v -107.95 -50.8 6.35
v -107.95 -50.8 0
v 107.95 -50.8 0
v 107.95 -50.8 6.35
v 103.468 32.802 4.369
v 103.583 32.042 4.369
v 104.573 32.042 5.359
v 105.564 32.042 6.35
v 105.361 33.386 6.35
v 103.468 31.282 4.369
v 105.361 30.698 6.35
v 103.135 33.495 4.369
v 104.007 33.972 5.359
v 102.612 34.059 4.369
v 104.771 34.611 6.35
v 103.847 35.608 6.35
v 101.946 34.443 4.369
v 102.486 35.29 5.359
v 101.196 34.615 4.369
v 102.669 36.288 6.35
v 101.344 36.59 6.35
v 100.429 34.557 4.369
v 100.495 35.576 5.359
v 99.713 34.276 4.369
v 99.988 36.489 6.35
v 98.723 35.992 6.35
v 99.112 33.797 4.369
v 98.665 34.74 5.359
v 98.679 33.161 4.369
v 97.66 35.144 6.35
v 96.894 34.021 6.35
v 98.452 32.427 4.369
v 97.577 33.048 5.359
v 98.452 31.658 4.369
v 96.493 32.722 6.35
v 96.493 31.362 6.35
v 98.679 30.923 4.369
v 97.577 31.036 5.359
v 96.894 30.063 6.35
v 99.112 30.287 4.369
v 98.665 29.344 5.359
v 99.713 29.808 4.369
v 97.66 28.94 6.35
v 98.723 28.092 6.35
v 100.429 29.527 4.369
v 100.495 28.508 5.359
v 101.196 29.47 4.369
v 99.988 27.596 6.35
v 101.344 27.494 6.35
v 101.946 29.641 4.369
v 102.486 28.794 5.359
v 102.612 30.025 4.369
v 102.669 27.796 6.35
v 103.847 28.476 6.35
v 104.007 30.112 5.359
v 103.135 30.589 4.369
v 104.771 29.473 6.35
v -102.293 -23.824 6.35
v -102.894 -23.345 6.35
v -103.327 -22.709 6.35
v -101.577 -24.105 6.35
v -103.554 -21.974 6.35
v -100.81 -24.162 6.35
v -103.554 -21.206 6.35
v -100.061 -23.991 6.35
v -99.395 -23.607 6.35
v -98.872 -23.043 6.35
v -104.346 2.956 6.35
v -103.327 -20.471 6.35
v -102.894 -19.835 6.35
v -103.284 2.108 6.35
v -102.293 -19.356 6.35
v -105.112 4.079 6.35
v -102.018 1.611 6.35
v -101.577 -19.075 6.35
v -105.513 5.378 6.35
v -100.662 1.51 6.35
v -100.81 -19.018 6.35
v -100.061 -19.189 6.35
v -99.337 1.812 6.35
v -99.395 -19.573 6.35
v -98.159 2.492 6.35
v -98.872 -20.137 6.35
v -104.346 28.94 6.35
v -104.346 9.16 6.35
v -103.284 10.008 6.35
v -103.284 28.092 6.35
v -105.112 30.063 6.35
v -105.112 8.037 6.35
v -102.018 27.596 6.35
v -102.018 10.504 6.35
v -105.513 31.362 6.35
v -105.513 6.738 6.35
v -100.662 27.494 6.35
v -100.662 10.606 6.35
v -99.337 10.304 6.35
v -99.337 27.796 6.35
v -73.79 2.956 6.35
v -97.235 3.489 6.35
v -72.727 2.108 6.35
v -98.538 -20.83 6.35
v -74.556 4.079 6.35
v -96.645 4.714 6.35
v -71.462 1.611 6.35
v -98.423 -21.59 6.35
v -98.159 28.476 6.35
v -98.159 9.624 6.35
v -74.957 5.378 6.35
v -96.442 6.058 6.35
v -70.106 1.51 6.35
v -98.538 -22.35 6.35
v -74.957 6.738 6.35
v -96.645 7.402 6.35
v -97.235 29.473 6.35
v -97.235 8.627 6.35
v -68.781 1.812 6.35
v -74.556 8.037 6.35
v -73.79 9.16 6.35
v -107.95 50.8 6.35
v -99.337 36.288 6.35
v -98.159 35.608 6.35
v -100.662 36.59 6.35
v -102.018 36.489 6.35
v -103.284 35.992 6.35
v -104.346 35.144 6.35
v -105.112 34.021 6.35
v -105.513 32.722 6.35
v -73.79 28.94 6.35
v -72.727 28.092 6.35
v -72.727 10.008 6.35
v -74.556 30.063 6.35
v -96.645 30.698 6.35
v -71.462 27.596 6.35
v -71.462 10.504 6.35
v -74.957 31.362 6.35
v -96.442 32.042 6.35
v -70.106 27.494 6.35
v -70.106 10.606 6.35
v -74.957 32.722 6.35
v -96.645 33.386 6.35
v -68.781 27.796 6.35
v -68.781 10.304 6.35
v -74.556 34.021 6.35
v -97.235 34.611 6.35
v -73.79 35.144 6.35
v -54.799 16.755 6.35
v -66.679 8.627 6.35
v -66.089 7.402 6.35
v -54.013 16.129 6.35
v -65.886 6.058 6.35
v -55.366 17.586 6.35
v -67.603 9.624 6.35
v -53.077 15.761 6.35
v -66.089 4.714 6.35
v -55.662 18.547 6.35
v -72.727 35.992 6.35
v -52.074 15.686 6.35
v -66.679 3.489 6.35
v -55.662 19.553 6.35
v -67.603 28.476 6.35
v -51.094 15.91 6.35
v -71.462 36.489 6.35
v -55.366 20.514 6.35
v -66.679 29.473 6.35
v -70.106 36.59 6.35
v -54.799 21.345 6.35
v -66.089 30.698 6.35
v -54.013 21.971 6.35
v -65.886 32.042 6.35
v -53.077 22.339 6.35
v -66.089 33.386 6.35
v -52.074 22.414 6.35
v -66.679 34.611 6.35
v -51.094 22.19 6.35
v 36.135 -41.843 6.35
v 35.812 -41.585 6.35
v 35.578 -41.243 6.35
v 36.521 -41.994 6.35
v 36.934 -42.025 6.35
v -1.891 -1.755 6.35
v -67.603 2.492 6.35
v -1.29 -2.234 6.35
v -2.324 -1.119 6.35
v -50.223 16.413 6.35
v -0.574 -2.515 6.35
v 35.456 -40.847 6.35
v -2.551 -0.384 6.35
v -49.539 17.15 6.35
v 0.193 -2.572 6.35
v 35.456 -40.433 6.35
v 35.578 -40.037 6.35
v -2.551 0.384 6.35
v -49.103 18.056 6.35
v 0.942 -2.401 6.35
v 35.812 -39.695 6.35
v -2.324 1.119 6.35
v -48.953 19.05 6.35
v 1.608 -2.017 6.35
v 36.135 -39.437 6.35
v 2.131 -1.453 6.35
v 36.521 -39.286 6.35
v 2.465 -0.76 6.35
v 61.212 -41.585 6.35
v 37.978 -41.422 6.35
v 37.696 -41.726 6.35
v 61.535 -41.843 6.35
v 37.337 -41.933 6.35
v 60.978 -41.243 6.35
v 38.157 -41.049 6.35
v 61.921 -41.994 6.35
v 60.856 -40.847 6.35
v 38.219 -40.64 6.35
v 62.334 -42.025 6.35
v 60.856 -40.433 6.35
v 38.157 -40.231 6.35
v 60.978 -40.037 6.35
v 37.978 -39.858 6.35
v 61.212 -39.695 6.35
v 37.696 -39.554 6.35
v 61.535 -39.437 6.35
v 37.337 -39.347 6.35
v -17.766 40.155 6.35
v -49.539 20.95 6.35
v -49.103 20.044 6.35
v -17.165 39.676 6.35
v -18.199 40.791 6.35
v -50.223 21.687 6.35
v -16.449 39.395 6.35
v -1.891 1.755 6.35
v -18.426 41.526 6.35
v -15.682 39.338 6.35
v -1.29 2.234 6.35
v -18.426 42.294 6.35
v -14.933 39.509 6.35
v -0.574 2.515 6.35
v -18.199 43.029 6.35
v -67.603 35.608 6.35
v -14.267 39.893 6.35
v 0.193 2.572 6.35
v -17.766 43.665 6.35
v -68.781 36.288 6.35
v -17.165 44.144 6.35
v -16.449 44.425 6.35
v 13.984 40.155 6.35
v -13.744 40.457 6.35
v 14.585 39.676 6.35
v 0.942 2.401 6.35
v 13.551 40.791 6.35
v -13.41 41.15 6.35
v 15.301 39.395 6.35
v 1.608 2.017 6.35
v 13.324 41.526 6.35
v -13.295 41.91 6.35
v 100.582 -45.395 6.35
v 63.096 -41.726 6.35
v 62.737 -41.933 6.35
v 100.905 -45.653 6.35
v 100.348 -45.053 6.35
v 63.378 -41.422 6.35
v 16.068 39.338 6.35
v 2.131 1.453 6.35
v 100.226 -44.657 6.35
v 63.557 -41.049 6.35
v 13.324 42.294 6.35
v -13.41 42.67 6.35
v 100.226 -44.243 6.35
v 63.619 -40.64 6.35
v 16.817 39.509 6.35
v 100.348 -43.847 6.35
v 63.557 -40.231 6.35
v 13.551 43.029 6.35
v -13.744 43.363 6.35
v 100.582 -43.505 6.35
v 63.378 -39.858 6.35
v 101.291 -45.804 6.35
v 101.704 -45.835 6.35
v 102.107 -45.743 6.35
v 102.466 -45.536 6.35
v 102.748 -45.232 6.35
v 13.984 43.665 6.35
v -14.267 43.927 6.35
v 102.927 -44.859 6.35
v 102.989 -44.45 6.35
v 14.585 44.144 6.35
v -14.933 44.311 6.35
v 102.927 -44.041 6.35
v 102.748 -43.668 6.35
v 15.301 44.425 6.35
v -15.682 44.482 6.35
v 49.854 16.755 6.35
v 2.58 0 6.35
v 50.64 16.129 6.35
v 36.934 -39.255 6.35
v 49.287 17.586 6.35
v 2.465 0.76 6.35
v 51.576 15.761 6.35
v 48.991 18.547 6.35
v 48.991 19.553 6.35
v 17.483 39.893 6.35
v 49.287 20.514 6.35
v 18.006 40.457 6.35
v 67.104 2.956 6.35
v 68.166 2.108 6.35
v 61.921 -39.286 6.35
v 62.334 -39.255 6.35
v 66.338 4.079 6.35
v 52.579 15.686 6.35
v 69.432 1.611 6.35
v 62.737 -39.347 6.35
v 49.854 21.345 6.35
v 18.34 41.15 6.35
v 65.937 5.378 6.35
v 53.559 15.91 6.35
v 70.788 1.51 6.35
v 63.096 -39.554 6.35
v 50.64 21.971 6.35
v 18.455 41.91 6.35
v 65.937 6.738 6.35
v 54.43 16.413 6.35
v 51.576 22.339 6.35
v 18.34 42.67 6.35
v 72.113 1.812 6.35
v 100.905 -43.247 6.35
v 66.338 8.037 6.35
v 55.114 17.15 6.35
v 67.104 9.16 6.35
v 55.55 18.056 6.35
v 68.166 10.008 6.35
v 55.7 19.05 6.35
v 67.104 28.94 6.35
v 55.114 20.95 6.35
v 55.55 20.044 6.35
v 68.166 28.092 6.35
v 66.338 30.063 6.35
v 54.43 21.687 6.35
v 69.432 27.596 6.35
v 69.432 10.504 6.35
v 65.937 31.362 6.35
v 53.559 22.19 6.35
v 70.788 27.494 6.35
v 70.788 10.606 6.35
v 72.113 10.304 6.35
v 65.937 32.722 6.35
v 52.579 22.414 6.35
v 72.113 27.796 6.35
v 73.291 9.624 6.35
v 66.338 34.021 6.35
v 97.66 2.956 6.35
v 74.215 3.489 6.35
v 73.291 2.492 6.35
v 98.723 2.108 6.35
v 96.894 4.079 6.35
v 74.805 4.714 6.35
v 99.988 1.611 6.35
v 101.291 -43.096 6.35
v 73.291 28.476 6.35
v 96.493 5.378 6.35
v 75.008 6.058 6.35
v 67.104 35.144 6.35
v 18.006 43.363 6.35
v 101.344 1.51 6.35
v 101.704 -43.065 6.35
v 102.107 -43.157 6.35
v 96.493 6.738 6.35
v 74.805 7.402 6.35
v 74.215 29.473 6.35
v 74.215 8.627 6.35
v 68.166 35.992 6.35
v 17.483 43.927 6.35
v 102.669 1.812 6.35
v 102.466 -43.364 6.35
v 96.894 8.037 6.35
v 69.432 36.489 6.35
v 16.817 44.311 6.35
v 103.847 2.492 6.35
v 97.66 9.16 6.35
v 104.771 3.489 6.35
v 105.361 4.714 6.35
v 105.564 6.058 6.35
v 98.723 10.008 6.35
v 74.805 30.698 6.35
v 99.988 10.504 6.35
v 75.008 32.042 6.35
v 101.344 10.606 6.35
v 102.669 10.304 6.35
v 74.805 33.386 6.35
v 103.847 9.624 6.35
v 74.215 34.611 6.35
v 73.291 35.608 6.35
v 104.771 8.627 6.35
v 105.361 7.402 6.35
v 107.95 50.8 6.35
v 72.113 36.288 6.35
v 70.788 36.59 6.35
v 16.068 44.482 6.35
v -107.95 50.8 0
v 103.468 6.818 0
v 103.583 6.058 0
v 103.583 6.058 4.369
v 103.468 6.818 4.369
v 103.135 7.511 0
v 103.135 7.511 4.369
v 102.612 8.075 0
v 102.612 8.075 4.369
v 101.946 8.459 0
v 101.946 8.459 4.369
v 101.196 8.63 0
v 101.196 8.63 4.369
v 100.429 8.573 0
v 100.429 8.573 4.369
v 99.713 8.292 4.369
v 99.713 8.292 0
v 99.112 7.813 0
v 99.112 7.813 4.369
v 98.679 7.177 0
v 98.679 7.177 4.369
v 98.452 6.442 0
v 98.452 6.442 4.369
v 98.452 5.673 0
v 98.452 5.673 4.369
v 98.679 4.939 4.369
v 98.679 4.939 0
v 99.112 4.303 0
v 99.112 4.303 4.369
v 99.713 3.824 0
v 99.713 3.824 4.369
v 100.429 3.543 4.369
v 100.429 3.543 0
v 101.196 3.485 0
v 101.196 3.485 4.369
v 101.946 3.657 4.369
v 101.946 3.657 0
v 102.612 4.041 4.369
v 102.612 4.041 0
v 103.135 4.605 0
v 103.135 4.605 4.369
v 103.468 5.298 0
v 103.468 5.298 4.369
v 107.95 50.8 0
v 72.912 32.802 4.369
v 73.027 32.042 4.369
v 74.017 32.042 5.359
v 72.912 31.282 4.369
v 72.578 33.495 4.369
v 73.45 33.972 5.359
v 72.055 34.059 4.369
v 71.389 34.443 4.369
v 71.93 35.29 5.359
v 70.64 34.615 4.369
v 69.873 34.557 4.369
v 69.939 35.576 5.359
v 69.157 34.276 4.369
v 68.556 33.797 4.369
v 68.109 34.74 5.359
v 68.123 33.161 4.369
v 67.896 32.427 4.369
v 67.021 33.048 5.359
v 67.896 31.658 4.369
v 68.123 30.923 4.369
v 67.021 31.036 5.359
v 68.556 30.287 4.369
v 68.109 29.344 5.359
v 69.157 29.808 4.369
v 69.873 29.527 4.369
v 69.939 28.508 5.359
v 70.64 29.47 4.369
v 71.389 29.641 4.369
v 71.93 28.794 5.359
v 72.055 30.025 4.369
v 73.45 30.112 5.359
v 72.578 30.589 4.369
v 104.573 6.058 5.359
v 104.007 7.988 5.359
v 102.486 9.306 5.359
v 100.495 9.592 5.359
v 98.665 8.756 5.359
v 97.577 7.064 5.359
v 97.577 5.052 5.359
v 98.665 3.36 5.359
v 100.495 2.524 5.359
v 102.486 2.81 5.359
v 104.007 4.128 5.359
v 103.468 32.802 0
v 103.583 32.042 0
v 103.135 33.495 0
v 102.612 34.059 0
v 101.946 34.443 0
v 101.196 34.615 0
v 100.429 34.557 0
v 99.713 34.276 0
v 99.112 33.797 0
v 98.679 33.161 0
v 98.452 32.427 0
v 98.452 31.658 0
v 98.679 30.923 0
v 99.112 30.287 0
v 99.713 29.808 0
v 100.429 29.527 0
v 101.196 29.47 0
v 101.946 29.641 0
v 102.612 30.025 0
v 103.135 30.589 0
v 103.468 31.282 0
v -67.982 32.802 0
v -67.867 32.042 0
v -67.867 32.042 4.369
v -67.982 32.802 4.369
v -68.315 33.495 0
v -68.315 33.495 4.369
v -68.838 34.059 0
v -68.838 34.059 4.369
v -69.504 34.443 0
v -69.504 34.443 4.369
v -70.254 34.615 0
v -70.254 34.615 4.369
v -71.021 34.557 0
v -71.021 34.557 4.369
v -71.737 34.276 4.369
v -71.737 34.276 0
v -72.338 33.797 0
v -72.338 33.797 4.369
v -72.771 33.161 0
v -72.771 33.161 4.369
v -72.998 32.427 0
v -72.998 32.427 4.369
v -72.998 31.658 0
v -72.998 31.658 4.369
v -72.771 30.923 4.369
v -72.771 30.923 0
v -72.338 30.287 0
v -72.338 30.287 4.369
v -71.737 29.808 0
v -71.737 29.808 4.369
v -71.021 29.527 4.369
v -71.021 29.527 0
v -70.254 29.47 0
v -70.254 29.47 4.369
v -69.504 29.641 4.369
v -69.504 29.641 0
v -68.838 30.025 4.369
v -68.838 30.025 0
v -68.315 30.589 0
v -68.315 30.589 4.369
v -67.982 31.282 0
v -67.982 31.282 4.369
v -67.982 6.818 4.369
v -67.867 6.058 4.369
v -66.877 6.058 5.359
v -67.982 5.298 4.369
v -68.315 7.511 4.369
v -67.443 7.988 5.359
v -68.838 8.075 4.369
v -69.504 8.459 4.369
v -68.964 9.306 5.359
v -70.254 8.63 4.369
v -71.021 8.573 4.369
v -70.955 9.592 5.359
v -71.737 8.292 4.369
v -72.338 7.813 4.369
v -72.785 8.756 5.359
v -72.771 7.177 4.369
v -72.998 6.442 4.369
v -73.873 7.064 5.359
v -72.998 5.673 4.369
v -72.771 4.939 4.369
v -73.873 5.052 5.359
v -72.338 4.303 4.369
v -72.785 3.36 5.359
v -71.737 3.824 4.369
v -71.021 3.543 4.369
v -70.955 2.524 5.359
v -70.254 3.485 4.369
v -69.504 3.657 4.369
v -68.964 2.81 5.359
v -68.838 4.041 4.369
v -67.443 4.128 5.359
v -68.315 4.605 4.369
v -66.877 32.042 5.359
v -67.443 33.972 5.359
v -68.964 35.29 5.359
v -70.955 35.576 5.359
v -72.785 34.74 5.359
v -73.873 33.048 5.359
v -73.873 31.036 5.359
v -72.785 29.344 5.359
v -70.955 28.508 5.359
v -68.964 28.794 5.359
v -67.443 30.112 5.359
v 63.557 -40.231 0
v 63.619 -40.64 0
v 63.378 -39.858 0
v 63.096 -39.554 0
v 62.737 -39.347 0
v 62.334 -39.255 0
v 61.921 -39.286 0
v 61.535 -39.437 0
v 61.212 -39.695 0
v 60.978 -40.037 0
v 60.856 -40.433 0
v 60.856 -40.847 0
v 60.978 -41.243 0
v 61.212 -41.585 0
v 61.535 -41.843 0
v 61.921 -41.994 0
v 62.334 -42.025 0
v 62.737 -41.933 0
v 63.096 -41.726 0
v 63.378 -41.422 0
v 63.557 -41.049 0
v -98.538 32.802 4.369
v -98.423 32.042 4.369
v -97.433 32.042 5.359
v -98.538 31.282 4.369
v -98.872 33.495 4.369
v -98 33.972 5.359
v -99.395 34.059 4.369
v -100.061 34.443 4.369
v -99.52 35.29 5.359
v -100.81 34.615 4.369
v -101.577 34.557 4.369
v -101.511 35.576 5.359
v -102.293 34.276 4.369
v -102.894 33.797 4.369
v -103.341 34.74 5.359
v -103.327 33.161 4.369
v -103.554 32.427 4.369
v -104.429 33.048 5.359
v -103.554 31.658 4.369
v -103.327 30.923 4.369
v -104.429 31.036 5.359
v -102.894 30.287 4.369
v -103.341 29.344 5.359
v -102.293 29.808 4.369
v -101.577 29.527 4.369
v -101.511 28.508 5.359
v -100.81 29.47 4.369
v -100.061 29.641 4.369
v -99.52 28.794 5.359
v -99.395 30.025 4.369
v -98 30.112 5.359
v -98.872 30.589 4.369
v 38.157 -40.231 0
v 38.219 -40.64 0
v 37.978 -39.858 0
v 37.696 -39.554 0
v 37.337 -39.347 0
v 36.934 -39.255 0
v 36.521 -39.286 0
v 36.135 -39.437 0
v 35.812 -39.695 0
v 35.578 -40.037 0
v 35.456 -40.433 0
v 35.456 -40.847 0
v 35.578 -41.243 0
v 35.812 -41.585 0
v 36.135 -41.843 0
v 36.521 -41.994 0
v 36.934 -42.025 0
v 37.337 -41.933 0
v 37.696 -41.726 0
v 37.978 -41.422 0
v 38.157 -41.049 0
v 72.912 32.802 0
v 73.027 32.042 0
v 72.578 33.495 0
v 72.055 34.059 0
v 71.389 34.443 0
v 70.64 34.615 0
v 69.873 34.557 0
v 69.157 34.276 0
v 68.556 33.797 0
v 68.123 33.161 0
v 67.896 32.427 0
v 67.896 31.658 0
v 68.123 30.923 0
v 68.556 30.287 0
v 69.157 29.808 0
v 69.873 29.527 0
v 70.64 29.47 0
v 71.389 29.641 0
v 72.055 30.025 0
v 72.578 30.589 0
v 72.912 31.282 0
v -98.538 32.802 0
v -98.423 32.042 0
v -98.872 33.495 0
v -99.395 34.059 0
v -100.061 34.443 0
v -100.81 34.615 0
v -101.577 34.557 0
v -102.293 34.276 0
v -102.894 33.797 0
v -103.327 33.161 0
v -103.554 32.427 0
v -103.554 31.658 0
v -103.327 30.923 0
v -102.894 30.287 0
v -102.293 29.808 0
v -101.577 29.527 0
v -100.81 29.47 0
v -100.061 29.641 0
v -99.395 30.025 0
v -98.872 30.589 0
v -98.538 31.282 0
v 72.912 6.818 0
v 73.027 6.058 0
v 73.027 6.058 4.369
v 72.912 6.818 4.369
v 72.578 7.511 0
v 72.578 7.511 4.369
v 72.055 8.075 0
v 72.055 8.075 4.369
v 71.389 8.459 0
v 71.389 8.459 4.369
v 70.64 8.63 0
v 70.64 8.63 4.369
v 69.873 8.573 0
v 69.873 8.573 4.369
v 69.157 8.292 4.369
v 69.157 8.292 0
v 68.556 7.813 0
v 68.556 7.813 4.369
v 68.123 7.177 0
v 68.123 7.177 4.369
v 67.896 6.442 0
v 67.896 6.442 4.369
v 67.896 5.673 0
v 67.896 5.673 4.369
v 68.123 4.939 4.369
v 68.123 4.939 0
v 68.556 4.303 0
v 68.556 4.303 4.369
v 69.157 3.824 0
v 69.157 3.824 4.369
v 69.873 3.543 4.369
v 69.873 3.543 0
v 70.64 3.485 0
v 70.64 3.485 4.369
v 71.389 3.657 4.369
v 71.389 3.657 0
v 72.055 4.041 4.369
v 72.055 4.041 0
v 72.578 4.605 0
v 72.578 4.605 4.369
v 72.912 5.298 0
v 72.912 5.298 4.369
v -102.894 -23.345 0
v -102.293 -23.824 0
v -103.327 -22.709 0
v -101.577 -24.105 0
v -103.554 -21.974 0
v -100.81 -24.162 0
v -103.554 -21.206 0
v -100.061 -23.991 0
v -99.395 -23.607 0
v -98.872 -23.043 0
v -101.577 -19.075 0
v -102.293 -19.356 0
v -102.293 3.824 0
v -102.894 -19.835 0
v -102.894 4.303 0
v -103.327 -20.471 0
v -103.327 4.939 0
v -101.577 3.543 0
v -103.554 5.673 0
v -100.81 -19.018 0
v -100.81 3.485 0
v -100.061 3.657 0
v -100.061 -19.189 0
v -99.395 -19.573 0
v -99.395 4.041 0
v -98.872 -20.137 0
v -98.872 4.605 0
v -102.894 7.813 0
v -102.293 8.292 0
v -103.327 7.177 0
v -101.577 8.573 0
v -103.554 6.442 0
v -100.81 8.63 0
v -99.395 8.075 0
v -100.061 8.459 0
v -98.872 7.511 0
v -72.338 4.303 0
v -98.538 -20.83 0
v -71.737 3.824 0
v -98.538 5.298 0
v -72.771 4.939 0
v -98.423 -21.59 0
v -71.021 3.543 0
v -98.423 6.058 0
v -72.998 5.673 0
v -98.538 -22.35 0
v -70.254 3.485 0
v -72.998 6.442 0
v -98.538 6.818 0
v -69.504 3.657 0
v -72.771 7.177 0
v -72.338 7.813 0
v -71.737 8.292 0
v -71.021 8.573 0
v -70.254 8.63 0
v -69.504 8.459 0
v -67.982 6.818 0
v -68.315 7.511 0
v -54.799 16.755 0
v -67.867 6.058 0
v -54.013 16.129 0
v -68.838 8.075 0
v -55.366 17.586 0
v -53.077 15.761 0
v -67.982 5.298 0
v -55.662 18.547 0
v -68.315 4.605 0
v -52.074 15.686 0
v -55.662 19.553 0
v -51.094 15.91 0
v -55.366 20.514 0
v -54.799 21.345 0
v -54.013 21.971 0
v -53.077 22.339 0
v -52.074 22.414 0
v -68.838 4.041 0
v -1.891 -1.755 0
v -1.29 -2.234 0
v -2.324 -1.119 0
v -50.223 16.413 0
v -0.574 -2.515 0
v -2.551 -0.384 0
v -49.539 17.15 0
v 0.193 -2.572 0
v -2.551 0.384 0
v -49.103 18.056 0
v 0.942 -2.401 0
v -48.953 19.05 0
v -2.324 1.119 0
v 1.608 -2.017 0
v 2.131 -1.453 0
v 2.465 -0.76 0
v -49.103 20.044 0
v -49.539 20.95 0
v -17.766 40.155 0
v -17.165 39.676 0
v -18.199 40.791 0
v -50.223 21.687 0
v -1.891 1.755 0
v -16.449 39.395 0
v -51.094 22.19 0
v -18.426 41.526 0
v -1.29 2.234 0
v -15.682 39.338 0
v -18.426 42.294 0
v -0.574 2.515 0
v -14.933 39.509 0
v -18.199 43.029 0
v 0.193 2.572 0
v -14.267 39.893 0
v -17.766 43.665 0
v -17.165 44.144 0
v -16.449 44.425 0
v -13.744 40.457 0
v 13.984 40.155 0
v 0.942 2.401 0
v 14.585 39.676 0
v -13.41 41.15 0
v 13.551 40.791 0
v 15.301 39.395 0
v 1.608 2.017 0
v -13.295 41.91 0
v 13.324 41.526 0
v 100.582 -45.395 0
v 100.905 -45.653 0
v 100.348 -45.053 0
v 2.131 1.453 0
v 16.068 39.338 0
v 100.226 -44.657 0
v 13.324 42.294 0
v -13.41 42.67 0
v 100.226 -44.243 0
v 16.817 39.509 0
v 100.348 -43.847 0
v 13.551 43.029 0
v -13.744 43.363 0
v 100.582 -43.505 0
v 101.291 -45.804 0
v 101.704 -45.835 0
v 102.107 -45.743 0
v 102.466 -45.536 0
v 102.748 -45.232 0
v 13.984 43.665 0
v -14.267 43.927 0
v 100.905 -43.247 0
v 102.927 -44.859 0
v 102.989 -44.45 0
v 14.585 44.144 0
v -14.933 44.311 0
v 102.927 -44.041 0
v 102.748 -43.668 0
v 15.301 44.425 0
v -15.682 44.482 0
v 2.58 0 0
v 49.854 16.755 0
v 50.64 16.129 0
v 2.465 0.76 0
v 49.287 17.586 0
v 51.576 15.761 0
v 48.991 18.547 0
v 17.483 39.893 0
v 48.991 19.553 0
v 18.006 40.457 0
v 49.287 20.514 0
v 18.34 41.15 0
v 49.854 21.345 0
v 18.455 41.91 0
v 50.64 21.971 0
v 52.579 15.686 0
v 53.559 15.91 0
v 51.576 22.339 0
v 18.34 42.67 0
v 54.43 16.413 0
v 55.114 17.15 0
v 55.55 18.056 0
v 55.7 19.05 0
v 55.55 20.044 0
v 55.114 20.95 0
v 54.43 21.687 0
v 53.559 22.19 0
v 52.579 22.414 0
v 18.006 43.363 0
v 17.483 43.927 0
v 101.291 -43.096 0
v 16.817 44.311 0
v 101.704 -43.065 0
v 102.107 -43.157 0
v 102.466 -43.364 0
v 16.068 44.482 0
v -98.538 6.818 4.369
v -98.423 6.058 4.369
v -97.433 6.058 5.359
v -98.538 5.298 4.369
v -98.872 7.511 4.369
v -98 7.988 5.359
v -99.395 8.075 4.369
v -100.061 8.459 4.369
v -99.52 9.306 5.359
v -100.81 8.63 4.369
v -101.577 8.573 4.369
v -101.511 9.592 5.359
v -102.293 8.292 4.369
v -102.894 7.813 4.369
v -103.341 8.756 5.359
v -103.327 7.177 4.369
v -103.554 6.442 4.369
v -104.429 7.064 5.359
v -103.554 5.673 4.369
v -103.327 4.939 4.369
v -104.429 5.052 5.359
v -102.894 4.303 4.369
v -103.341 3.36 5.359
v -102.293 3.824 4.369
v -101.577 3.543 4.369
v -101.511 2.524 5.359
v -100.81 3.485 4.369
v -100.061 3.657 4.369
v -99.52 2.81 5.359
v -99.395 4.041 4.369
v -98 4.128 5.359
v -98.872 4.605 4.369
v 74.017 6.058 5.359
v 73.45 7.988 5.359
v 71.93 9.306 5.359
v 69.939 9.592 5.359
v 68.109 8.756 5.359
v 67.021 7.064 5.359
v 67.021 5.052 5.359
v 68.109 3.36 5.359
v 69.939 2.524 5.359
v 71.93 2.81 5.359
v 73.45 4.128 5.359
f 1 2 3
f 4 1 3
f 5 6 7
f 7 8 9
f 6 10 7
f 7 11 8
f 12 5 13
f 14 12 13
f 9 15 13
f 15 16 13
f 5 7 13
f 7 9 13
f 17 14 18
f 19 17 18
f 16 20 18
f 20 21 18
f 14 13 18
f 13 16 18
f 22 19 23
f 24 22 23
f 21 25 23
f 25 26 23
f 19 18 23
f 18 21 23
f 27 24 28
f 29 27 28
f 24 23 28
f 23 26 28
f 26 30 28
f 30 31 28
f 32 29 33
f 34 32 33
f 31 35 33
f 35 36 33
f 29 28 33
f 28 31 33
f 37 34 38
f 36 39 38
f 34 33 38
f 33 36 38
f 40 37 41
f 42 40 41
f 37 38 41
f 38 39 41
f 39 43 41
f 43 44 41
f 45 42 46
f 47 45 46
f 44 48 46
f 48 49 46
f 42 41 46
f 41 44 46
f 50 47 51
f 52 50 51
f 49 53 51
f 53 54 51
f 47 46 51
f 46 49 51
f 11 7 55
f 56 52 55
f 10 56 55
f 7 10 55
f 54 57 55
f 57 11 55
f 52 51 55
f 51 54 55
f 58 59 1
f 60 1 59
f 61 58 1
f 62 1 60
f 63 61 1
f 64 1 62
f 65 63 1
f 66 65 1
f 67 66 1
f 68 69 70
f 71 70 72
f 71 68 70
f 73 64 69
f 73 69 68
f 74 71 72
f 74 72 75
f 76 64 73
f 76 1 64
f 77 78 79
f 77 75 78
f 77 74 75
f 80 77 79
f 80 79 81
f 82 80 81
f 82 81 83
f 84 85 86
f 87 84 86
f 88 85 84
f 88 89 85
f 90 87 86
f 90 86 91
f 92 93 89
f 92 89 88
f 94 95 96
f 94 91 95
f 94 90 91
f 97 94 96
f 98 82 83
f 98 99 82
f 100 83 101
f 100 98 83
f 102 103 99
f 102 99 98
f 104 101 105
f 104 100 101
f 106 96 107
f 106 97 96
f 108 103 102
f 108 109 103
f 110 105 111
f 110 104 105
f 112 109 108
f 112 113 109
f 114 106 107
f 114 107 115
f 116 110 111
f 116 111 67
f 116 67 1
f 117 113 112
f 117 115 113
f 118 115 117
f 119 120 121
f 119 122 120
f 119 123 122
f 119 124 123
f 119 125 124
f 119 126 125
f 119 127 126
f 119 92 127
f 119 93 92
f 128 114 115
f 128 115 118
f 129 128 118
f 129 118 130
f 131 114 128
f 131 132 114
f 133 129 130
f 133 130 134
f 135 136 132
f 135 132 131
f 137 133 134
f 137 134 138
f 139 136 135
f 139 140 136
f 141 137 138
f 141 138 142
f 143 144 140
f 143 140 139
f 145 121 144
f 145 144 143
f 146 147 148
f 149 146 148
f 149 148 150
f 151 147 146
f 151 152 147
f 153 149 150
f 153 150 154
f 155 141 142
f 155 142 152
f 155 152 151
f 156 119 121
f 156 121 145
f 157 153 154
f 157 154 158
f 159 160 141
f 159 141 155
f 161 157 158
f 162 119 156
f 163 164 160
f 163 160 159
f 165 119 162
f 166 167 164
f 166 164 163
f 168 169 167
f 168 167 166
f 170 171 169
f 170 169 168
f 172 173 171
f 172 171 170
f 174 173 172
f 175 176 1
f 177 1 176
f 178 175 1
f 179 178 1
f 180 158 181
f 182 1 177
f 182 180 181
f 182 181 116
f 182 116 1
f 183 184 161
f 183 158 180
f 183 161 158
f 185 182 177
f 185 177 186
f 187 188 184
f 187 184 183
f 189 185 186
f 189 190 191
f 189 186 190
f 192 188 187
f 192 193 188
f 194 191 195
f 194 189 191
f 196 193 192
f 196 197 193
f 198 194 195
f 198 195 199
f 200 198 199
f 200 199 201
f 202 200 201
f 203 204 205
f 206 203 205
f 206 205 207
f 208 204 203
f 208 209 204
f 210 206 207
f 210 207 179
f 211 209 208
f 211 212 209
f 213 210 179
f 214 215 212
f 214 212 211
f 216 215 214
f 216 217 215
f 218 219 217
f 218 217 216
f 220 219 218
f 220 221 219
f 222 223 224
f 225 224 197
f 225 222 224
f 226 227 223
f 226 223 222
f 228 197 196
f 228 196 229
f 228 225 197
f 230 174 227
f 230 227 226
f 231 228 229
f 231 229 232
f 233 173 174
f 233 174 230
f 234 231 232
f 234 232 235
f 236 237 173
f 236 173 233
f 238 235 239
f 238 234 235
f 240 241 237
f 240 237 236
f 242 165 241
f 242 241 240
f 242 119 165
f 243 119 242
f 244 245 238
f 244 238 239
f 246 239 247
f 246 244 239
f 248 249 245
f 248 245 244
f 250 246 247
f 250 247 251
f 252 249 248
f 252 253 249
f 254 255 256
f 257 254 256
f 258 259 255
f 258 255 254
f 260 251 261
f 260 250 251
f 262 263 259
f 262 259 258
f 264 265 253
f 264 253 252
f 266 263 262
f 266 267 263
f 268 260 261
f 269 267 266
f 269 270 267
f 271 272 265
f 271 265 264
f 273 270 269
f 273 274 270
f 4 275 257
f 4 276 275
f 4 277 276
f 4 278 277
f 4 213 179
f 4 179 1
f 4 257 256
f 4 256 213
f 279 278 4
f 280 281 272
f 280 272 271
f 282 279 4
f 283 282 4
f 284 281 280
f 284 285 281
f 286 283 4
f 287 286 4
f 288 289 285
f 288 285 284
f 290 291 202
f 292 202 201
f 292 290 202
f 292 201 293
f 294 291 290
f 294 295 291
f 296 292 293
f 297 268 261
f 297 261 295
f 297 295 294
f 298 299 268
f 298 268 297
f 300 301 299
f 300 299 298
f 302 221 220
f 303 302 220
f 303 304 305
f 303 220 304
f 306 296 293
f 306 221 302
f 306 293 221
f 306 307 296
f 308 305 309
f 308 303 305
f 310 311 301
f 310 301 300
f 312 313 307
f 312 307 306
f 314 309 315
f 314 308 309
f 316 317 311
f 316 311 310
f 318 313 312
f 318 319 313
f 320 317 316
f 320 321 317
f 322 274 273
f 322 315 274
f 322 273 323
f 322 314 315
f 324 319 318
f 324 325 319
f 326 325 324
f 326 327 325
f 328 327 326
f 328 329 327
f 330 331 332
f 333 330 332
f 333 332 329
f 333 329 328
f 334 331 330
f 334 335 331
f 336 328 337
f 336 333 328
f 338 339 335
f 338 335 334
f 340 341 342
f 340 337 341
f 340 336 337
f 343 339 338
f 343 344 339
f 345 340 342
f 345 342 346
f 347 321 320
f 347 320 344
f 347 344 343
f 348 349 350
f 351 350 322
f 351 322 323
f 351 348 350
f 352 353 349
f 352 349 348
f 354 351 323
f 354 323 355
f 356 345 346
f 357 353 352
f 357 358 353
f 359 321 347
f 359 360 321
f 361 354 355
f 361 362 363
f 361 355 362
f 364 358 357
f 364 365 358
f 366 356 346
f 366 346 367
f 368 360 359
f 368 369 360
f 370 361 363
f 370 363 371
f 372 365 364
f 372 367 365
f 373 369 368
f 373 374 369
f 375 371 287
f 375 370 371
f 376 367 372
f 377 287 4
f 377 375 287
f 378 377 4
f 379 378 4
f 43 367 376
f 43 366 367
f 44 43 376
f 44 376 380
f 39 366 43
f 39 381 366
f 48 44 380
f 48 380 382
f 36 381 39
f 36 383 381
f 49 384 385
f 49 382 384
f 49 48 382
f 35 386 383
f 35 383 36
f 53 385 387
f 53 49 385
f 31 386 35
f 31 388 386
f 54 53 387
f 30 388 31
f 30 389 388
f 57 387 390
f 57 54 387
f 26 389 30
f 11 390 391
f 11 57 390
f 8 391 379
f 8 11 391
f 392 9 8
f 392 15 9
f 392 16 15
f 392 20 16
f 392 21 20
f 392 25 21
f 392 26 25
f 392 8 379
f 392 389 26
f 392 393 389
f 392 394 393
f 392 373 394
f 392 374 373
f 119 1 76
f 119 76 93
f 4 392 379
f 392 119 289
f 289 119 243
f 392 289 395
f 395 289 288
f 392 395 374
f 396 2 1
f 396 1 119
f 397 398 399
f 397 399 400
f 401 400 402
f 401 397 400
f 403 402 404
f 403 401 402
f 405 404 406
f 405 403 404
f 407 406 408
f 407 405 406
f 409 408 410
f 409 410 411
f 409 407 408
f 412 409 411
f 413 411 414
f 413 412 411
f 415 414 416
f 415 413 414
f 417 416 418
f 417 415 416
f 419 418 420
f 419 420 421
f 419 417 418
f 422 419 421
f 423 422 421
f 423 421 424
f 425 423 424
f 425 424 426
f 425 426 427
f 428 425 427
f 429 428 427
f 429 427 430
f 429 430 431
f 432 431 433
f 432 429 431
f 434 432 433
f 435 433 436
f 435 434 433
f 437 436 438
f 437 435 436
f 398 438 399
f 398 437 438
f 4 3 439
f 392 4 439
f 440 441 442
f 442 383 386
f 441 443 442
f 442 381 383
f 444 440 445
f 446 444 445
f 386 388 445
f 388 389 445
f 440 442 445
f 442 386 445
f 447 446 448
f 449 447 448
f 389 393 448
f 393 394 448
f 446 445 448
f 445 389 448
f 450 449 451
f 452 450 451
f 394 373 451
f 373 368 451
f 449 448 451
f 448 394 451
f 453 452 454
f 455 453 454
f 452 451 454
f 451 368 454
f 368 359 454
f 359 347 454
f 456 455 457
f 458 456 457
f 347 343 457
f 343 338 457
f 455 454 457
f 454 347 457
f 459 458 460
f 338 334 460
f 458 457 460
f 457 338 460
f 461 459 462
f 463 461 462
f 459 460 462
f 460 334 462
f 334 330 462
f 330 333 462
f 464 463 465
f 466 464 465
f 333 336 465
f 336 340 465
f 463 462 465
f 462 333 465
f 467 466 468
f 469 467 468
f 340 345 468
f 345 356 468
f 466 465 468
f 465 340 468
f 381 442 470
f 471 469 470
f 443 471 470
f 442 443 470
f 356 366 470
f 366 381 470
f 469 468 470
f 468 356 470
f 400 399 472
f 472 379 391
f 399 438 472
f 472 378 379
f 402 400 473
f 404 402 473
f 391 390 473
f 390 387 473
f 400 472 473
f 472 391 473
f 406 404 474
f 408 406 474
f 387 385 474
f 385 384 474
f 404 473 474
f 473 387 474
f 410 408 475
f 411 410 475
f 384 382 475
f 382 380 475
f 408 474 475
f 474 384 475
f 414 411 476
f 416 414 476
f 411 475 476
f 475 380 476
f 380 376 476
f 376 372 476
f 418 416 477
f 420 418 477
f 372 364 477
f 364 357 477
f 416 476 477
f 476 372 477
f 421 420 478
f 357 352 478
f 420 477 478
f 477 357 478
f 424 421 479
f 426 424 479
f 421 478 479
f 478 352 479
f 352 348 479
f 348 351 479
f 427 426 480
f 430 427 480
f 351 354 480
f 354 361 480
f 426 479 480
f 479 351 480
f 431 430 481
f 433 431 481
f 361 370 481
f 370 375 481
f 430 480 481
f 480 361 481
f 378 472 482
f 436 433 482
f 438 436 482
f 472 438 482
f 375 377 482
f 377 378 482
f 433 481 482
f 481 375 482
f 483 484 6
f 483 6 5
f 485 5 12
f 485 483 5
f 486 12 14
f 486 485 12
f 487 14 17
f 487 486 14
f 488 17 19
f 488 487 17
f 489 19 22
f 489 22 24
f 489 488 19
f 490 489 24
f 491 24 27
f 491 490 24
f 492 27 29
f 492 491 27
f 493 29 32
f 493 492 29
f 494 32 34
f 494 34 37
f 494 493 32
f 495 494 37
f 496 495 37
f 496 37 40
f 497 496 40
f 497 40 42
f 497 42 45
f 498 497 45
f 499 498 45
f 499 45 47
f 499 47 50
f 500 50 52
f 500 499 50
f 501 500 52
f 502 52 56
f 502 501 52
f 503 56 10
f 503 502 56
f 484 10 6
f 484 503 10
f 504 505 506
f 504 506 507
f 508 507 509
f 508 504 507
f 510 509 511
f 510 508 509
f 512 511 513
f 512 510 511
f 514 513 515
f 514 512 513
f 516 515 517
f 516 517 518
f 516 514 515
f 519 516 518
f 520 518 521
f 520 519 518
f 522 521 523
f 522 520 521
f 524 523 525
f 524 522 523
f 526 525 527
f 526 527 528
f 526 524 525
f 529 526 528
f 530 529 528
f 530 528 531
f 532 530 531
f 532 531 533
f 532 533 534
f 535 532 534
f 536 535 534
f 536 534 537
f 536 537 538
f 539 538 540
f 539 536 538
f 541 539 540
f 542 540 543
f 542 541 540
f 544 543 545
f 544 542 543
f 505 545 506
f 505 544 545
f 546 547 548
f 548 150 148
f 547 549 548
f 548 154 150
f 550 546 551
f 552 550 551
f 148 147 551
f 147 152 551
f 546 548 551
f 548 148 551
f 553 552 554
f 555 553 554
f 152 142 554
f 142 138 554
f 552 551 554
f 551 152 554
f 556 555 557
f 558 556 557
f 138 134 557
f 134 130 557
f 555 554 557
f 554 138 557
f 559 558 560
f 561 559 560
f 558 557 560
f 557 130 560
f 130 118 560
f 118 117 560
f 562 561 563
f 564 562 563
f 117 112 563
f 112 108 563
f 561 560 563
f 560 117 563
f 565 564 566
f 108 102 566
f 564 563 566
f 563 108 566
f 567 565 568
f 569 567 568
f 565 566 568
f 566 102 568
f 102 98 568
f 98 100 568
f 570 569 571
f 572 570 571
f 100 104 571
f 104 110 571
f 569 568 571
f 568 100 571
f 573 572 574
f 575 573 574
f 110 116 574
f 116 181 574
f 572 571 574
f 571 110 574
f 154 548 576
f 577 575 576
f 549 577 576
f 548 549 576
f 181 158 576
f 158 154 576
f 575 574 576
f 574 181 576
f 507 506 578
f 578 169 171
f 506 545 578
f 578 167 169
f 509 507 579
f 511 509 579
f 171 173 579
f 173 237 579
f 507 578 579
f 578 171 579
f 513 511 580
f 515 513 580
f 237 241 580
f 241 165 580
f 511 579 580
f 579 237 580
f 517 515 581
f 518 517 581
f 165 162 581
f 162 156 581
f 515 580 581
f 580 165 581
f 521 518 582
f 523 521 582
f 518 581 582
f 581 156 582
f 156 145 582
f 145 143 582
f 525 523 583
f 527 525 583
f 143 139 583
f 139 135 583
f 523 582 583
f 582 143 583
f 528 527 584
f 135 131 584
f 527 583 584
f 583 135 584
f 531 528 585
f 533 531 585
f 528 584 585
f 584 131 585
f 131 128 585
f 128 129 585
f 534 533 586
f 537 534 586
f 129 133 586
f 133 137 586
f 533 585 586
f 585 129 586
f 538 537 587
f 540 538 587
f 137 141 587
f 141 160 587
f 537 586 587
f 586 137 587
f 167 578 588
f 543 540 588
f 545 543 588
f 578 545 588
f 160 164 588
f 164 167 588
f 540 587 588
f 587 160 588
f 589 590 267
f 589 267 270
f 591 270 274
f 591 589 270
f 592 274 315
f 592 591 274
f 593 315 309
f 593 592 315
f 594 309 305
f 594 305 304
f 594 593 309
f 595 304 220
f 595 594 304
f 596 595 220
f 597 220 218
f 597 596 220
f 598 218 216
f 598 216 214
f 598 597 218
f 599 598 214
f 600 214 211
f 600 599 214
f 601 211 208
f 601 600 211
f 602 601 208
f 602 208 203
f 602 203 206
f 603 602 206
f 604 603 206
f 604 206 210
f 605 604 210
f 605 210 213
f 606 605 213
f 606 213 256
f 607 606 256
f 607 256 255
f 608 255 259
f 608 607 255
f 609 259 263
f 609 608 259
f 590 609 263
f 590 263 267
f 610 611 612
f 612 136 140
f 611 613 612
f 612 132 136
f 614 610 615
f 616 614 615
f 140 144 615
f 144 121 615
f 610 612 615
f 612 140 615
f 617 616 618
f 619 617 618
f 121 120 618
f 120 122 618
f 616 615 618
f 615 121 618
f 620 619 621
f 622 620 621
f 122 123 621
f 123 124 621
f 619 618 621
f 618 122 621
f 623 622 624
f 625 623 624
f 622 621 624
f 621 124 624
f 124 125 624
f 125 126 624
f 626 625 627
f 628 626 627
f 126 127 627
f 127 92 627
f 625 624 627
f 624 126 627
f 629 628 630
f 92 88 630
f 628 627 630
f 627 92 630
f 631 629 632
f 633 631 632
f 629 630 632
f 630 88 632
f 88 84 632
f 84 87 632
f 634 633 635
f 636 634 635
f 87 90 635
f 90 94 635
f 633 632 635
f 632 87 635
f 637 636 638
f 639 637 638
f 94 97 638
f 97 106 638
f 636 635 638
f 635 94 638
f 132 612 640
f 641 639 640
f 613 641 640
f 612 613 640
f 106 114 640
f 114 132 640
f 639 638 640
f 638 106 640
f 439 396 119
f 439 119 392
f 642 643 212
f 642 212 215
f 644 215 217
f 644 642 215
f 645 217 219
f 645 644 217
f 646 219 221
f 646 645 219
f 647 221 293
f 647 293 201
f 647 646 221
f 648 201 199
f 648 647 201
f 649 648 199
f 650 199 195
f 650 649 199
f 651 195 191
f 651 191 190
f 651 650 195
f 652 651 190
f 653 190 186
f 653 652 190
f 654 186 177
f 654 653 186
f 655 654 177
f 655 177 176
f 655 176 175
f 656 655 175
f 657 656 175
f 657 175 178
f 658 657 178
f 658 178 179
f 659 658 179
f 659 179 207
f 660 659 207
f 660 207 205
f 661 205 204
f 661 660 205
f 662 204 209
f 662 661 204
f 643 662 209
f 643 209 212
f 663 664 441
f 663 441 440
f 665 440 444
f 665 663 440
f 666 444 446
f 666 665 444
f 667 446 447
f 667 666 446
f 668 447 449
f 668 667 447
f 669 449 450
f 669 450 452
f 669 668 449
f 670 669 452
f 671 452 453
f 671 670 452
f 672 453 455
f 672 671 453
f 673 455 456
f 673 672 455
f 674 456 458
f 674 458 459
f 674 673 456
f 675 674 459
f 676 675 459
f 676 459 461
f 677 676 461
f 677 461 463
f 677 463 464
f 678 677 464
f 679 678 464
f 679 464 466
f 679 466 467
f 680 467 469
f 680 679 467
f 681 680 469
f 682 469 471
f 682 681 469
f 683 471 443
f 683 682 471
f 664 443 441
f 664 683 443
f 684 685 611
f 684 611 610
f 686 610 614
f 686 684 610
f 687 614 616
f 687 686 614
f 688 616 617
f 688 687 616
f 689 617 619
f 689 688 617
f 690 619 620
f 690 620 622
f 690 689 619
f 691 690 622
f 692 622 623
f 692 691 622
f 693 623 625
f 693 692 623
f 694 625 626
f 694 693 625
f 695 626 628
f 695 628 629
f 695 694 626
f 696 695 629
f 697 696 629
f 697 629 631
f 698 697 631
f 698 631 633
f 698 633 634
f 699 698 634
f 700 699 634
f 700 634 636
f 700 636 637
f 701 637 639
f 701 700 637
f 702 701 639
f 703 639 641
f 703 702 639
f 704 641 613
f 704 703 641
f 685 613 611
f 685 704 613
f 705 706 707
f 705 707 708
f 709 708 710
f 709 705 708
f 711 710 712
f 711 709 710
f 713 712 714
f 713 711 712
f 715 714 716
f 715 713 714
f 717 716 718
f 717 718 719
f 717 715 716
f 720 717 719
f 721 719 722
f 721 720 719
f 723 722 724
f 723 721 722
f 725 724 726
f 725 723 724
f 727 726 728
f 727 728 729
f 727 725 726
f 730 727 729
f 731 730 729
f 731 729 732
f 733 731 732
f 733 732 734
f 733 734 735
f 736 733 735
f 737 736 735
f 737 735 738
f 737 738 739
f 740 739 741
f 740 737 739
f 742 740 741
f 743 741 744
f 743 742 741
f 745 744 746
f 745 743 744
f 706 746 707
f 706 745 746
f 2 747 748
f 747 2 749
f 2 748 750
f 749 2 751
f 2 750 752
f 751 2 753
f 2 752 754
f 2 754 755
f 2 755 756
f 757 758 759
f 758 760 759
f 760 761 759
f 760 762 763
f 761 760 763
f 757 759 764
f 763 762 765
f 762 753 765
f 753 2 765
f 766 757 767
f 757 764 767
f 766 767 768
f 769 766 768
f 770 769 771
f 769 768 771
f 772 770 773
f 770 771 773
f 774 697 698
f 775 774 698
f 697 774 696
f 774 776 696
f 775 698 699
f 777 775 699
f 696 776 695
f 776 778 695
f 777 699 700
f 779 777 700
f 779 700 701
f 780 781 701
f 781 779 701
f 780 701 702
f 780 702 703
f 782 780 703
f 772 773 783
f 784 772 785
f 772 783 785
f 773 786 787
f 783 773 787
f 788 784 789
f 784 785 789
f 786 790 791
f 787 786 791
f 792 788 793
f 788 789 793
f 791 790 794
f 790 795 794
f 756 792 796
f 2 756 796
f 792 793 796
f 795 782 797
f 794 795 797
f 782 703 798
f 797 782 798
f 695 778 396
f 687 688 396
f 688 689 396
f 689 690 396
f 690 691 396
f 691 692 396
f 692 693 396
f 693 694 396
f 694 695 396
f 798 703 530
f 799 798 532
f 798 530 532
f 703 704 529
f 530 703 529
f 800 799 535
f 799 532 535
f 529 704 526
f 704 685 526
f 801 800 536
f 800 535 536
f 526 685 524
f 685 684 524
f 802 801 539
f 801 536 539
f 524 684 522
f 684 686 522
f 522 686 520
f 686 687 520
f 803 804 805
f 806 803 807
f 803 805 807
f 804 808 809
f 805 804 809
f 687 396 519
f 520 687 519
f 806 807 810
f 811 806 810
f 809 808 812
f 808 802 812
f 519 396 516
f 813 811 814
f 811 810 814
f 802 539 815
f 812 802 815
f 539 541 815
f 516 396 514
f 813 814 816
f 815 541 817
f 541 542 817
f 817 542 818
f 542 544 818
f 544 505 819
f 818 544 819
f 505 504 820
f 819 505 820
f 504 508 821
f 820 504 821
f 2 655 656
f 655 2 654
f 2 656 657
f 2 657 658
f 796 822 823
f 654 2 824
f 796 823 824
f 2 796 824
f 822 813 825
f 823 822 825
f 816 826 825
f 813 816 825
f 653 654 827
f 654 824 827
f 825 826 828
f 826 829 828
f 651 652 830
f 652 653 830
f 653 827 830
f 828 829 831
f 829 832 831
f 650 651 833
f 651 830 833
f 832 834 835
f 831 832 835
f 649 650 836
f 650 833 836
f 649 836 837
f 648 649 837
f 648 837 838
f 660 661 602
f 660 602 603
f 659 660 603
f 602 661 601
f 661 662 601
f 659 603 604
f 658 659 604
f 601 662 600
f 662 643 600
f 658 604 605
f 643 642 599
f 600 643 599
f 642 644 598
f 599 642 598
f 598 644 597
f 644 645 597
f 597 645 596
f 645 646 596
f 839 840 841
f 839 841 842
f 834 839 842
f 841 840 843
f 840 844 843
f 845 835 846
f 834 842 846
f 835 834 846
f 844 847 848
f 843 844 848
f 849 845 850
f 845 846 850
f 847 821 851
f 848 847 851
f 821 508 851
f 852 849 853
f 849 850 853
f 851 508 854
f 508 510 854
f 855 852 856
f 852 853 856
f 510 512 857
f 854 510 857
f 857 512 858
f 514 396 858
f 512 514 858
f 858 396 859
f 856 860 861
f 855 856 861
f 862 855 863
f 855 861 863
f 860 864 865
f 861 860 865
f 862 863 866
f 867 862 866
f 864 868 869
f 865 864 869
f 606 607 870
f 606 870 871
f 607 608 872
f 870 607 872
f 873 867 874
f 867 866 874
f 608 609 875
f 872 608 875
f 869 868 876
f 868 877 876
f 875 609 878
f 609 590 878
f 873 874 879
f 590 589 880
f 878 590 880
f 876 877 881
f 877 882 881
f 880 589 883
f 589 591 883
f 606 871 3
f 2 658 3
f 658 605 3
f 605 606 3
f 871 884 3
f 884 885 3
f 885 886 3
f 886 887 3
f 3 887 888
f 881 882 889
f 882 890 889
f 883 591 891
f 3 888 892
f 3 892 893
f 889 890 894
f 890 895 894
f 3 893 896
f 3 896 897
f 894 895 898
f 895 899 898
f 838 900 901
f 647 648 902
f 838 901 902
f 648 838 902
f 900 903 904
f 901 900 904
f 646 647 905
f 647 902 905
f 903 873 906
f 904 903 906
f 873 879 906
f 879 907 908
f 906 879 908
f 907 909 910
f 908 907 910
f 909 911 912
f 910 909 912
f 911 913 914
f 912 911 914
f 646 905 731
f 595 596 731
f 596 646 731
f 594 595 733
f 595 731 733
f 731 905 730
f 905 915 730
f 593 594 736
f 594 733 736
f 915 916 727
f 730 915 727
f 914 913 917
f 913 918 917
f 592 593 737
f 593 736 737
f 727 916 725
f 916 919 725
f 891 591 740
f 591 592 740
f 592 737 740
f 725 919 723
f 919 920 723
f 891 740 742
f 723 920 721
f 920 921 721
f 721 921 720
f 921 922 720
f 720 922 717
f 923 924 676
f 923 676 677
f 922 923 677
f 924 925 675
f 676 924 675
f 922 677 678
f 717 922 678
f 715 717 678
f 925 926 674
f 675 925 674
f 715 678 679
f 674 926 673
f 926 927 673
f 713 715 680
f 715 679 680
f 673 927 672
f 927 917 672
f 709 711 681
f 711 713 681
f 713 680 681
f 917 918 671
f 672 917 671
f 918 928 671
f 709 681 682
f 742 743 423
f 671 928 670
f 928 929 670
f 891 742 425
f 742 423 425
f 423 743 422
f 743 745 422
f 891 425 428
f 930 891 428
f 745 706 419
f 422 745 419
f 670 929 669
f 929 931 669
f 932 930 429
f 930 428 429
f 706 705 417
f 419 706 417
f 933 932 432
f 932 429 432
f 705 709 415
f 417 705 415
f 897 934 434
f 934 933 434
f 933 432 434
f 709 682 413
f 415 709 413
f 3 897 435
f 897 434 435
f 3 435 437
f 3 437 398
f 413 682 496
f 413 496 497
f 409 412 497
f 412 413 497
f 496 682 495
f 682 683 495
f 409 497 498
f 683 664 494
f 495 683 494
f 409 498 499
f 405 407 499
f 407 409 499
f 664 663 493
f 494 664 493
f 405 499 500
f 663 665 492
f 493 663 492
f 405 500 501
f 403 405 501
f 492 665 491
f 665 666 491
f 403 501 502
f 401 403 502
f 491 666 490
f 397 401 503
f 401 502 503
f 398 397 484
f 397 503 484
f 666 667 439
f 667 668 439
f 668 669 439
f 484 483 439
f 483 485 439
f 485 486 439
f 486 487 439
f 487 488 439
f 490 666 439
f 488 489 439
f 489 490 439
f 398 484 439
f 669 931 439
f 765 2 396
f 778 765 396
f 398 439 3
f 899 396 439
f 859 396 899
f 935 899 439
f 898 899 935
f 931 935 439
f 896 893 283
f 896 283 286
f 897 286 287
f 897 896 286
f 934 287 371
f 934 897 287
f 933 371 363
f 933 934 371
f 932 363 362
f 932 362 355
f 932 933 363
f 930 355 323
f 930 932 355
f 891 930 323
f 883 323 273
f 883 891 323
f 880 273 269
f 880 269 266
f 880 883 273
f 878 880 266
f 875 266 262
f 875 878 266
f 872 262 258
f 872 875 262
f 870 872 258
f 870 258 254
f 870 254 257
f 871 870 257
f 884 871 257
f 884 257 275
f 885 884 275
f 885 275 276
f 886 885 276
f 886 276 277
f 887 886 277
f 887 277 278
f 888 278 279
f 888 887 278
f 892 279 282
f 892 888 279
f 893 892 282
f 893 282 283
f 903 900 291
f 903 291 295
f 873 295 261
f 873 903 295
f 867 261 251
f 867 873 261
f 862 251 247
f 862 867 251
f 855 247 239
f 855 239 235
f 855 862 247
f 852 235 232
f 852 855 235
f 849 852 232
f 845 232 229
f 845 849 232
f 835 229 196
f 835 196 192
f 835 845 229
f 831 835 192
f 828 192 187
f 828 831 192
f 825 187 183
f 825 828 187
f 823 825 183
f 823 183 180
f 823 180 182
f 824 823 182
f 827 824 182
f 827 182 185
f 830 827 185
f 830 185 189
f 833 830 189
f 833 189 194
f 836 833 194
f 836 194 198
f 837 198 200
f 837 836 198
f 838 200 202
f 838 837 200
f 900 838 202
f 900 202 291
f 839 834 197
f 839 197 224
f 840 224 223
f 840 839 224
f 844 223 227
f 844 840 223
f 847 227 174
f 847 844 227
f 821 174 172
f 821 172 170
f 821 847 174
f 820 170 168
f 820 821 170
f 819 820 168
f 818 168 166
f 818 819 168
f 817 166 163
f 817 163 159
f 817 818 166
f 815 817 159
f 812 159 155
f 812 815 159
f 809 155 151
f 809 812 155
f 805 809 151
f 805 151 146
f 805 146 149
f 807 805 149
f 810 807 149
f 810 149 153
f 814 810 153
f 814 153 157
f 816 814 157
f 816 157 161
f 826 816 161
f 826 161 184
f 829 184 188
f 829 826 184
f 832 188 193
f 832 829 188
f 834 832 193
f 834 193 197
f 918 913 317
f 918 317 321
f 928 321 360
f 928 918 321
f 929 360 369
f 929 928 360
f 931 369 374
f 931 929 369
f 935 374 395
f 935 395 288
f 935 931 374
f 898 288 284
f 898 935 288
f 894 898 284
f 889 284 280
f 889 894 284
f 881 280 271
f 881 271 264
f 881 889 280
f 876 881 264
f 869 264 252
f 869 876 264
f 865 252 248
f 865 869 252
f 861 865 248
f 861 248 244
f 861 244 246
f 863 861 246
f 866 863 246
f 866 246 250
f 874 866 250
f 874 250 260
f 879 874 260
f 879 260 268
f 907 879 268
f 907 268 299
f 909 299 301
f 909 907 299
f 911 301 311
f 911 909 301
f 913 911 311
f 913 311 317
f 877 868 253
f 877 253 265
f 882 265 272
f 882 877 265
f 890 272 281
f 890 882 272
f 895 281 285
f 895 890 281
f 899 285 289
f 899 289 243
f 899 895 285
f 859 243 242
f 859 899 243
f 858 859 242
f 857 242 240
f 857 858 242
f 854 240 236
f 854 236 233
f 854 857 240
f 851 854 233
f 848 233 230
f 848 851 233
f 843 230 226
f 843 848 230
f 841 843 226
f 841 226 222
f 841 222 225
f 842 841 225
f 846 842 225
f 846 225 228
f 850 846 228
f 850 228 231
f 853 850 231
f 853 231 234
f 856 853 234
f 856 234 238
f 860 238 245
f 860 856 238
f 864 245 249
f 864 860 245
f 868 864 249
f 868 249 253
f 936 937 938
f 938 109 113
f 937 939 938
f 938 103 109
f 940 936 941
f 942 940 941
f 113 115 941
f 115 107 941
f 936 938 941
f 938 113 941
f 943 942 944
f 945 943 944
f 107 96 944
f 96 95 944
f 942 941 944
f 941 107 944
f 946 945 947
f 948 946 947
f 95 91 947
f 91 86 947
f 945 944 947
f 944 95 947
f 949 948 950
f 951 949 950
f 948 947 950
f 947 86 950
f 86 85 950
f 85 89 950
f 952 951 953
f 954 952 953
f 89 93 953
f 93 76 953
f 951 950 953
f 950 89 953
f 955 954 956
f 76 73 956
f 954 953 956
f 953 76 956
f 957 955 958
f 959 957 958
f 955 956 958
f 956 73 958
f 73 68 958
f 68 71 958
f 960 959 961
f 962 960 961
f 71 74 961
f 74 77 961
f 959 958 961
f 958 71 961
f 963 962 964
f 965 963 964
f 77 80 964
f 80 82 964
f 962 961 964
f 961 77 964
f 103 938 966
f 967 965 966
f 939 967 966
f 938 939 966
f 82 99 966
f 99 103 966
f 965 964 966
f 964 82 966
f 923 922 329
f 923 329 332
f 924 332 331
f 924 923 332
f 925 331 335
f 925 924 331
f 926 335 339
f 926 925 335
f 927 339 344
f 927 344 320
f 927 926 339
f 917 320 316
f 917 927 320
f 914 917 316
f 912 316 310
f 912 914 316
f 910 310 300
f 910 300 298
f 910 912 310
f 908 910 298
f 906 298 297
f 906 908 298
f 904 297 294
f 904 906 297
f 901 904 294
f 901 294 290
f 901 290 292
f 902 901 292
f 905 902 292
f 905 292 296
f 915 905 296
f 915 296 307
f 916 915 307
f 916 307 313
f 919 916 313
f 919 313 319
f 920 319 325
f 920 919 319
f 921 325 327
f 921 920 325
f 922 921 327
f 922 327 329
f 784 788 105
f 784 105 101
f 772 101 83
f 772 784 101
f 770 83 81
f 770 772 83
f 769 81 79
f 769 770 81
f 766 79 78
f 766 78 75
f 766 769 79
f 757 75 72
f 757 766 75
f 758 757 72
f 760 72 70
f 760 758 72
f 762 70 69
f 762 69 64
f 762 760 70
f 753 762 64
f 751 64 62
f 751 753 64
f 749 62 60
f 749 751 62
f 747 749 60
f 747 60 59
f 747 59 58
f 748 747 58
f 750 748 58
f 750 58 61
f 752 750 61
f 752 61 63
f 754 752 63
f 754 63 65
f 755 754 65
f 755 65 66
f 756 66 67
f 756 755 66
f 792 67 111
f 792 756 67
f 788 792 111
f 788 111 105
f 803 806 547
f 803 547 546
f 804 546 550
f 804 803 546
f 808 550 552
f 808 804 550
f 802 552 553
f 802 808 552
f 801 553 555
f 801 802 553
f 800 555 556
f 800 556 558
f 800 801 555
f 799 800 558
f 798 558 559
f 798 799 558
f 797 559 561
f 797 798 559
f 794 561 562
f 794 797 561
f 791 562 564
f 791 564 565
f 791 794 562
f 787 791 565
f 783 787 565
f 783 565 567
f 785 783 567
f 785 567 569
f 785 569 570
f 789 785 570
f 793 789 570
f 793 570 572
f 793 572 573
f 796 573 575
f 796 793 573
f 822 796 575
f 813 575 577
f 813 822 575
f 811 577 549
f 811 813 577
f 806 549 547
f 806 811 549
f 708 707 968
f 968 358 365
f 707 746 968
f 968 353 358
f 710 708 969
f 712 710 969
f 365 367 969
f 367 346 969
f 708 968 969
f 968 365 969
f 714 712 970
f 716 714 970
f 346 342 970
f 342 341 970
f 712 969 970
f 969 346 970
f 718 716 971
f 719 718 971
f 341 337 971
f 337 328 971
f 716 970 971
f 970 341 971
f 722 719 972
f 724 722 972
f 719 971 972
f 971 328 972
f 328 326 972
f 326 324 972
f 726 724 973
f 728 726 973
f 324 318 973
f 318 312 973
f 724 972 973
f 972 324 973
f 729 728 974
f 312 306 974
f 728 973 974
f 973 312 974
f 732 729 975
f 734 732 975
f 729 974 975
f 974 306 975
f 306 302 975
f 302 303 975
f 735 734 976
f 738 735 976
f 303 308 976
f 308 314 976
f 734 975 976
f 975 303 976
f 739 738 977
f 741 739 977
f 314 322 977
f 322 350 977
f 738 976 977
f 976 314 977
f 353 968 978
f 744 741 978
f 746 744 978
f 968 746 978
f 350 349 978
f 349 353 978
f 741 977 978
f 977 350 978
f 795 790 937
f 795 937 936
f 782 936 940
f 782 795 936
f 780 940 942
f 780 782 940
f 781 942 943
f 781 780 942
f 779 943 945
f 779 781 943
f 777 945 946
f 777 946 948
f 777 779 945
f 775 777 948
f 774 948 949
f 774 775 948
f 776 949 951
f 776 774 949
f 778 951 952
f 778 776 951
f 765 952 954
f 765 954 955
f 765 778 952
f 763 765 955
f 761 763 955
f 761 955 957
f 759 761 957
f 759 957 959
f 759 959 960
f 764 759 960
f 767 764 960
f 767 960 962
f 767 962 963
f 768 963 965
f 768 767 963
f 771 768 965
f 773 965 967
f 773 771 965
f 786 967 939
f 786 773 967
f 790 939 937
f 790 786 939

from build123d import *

# Parameters (mm, degrees)
F0_W     = 215.9
F0_H     = 101.6
F0_R     = 2.579688
F0_R_2   = 1.389063
F0_R_3   = 3.373438
F1_DEPTH = 6.35
F2_SIZE  = 1.9812


with BuildPart() as f1:
    # F0 (on Top) → F1 (new body)
    with BuildSketch(Plane.XY):
        Rectangle(F0_W, F0_H)
        with Locations((-101.0031, -21.59)):
            Circle(F0_R, mode=Mode.SUBTRACT)
        with Locations((36.83, -40.64)):
            Circle(F0_R_2, mode=Mode.SUBTRACT)
        with Locations((62.23, -40.64)):
            Circle(F0_R_2, mode=Mode.SUBTRACT)
        with Locations((101.6, -44.45)):
            Circle(F0_R_2, mode=Mode.SUBTRACT)
        Circle(F0_R, mode=Mode.SUBTRACT)
        with Locations((-101.0031, 6.0579)):
            Circle(F0_R, mode=Mode.SUBTRACT)
        with Locations((-70.4469, 6.0579)):
            Circle(F0_R, mode=Mode.SUBTRACT)
        with Locations((-52.32654, 19.05)):
            Circle(F0_R_3, mode=Mode.SUBTRACT)
        with Locations((-101.0031, 32.0421)):
            Circle(F0_R, mode=Mode.SUBTRACT)
        with Locations((-70.4469, 32.0421)):
            Circle(F0_R, mode=Mode.SUBTRACT)
        with Locations((-15.875, 41.91)):
            Circle(F0_R, mode=Mode.SUBTRACT)
        with Locations((52.32654, 19.05)):
            Circle(F0_R_3, mode=Mode.SUBTRACT)
        with Locations((70.4469, 6.0579)):
            Circle(F0_R, mode=Mode.SUBTRACT)
        with Locations((101.0031, 6.0579)):
            Circle(F0_R, mode=Mode.SUBTRACT)
        with Locations((15.875, 41.91)):
            Circle(F0_R, mode=Mode.SUBTRACT)
        with Locations((70.4469, 32.0421)):
            Circle(F0_R, mode=Mode.SUBTRACT)
        with Locations((101.0031, 32.0421)):
            Circle(F0_R, mode=Mode.SUBTRACT)
    extrude(amount=F1_DEPTH)

    # F2
    f2_edges = [f1.edges().sort_by_distance(p)[0] for p in [
        (-73.026588, 32.0421, 6.35),
        (-103.582788, 32.0421, 6.35),
        (-103.582788, 6.0579, 6.35),
        (-73.026588, 6.0579, 6.35),
        (67.867212, 32.0421, 6.35),
        (67.867212, 6.0579, 6.35),
        (98.423412, 6.0579, 6.35),
        (98.423412, 32.0421, 6.35),
    ]]
    chamfer(f2_edges, length=F2_SIZE)


solid = f1.part
